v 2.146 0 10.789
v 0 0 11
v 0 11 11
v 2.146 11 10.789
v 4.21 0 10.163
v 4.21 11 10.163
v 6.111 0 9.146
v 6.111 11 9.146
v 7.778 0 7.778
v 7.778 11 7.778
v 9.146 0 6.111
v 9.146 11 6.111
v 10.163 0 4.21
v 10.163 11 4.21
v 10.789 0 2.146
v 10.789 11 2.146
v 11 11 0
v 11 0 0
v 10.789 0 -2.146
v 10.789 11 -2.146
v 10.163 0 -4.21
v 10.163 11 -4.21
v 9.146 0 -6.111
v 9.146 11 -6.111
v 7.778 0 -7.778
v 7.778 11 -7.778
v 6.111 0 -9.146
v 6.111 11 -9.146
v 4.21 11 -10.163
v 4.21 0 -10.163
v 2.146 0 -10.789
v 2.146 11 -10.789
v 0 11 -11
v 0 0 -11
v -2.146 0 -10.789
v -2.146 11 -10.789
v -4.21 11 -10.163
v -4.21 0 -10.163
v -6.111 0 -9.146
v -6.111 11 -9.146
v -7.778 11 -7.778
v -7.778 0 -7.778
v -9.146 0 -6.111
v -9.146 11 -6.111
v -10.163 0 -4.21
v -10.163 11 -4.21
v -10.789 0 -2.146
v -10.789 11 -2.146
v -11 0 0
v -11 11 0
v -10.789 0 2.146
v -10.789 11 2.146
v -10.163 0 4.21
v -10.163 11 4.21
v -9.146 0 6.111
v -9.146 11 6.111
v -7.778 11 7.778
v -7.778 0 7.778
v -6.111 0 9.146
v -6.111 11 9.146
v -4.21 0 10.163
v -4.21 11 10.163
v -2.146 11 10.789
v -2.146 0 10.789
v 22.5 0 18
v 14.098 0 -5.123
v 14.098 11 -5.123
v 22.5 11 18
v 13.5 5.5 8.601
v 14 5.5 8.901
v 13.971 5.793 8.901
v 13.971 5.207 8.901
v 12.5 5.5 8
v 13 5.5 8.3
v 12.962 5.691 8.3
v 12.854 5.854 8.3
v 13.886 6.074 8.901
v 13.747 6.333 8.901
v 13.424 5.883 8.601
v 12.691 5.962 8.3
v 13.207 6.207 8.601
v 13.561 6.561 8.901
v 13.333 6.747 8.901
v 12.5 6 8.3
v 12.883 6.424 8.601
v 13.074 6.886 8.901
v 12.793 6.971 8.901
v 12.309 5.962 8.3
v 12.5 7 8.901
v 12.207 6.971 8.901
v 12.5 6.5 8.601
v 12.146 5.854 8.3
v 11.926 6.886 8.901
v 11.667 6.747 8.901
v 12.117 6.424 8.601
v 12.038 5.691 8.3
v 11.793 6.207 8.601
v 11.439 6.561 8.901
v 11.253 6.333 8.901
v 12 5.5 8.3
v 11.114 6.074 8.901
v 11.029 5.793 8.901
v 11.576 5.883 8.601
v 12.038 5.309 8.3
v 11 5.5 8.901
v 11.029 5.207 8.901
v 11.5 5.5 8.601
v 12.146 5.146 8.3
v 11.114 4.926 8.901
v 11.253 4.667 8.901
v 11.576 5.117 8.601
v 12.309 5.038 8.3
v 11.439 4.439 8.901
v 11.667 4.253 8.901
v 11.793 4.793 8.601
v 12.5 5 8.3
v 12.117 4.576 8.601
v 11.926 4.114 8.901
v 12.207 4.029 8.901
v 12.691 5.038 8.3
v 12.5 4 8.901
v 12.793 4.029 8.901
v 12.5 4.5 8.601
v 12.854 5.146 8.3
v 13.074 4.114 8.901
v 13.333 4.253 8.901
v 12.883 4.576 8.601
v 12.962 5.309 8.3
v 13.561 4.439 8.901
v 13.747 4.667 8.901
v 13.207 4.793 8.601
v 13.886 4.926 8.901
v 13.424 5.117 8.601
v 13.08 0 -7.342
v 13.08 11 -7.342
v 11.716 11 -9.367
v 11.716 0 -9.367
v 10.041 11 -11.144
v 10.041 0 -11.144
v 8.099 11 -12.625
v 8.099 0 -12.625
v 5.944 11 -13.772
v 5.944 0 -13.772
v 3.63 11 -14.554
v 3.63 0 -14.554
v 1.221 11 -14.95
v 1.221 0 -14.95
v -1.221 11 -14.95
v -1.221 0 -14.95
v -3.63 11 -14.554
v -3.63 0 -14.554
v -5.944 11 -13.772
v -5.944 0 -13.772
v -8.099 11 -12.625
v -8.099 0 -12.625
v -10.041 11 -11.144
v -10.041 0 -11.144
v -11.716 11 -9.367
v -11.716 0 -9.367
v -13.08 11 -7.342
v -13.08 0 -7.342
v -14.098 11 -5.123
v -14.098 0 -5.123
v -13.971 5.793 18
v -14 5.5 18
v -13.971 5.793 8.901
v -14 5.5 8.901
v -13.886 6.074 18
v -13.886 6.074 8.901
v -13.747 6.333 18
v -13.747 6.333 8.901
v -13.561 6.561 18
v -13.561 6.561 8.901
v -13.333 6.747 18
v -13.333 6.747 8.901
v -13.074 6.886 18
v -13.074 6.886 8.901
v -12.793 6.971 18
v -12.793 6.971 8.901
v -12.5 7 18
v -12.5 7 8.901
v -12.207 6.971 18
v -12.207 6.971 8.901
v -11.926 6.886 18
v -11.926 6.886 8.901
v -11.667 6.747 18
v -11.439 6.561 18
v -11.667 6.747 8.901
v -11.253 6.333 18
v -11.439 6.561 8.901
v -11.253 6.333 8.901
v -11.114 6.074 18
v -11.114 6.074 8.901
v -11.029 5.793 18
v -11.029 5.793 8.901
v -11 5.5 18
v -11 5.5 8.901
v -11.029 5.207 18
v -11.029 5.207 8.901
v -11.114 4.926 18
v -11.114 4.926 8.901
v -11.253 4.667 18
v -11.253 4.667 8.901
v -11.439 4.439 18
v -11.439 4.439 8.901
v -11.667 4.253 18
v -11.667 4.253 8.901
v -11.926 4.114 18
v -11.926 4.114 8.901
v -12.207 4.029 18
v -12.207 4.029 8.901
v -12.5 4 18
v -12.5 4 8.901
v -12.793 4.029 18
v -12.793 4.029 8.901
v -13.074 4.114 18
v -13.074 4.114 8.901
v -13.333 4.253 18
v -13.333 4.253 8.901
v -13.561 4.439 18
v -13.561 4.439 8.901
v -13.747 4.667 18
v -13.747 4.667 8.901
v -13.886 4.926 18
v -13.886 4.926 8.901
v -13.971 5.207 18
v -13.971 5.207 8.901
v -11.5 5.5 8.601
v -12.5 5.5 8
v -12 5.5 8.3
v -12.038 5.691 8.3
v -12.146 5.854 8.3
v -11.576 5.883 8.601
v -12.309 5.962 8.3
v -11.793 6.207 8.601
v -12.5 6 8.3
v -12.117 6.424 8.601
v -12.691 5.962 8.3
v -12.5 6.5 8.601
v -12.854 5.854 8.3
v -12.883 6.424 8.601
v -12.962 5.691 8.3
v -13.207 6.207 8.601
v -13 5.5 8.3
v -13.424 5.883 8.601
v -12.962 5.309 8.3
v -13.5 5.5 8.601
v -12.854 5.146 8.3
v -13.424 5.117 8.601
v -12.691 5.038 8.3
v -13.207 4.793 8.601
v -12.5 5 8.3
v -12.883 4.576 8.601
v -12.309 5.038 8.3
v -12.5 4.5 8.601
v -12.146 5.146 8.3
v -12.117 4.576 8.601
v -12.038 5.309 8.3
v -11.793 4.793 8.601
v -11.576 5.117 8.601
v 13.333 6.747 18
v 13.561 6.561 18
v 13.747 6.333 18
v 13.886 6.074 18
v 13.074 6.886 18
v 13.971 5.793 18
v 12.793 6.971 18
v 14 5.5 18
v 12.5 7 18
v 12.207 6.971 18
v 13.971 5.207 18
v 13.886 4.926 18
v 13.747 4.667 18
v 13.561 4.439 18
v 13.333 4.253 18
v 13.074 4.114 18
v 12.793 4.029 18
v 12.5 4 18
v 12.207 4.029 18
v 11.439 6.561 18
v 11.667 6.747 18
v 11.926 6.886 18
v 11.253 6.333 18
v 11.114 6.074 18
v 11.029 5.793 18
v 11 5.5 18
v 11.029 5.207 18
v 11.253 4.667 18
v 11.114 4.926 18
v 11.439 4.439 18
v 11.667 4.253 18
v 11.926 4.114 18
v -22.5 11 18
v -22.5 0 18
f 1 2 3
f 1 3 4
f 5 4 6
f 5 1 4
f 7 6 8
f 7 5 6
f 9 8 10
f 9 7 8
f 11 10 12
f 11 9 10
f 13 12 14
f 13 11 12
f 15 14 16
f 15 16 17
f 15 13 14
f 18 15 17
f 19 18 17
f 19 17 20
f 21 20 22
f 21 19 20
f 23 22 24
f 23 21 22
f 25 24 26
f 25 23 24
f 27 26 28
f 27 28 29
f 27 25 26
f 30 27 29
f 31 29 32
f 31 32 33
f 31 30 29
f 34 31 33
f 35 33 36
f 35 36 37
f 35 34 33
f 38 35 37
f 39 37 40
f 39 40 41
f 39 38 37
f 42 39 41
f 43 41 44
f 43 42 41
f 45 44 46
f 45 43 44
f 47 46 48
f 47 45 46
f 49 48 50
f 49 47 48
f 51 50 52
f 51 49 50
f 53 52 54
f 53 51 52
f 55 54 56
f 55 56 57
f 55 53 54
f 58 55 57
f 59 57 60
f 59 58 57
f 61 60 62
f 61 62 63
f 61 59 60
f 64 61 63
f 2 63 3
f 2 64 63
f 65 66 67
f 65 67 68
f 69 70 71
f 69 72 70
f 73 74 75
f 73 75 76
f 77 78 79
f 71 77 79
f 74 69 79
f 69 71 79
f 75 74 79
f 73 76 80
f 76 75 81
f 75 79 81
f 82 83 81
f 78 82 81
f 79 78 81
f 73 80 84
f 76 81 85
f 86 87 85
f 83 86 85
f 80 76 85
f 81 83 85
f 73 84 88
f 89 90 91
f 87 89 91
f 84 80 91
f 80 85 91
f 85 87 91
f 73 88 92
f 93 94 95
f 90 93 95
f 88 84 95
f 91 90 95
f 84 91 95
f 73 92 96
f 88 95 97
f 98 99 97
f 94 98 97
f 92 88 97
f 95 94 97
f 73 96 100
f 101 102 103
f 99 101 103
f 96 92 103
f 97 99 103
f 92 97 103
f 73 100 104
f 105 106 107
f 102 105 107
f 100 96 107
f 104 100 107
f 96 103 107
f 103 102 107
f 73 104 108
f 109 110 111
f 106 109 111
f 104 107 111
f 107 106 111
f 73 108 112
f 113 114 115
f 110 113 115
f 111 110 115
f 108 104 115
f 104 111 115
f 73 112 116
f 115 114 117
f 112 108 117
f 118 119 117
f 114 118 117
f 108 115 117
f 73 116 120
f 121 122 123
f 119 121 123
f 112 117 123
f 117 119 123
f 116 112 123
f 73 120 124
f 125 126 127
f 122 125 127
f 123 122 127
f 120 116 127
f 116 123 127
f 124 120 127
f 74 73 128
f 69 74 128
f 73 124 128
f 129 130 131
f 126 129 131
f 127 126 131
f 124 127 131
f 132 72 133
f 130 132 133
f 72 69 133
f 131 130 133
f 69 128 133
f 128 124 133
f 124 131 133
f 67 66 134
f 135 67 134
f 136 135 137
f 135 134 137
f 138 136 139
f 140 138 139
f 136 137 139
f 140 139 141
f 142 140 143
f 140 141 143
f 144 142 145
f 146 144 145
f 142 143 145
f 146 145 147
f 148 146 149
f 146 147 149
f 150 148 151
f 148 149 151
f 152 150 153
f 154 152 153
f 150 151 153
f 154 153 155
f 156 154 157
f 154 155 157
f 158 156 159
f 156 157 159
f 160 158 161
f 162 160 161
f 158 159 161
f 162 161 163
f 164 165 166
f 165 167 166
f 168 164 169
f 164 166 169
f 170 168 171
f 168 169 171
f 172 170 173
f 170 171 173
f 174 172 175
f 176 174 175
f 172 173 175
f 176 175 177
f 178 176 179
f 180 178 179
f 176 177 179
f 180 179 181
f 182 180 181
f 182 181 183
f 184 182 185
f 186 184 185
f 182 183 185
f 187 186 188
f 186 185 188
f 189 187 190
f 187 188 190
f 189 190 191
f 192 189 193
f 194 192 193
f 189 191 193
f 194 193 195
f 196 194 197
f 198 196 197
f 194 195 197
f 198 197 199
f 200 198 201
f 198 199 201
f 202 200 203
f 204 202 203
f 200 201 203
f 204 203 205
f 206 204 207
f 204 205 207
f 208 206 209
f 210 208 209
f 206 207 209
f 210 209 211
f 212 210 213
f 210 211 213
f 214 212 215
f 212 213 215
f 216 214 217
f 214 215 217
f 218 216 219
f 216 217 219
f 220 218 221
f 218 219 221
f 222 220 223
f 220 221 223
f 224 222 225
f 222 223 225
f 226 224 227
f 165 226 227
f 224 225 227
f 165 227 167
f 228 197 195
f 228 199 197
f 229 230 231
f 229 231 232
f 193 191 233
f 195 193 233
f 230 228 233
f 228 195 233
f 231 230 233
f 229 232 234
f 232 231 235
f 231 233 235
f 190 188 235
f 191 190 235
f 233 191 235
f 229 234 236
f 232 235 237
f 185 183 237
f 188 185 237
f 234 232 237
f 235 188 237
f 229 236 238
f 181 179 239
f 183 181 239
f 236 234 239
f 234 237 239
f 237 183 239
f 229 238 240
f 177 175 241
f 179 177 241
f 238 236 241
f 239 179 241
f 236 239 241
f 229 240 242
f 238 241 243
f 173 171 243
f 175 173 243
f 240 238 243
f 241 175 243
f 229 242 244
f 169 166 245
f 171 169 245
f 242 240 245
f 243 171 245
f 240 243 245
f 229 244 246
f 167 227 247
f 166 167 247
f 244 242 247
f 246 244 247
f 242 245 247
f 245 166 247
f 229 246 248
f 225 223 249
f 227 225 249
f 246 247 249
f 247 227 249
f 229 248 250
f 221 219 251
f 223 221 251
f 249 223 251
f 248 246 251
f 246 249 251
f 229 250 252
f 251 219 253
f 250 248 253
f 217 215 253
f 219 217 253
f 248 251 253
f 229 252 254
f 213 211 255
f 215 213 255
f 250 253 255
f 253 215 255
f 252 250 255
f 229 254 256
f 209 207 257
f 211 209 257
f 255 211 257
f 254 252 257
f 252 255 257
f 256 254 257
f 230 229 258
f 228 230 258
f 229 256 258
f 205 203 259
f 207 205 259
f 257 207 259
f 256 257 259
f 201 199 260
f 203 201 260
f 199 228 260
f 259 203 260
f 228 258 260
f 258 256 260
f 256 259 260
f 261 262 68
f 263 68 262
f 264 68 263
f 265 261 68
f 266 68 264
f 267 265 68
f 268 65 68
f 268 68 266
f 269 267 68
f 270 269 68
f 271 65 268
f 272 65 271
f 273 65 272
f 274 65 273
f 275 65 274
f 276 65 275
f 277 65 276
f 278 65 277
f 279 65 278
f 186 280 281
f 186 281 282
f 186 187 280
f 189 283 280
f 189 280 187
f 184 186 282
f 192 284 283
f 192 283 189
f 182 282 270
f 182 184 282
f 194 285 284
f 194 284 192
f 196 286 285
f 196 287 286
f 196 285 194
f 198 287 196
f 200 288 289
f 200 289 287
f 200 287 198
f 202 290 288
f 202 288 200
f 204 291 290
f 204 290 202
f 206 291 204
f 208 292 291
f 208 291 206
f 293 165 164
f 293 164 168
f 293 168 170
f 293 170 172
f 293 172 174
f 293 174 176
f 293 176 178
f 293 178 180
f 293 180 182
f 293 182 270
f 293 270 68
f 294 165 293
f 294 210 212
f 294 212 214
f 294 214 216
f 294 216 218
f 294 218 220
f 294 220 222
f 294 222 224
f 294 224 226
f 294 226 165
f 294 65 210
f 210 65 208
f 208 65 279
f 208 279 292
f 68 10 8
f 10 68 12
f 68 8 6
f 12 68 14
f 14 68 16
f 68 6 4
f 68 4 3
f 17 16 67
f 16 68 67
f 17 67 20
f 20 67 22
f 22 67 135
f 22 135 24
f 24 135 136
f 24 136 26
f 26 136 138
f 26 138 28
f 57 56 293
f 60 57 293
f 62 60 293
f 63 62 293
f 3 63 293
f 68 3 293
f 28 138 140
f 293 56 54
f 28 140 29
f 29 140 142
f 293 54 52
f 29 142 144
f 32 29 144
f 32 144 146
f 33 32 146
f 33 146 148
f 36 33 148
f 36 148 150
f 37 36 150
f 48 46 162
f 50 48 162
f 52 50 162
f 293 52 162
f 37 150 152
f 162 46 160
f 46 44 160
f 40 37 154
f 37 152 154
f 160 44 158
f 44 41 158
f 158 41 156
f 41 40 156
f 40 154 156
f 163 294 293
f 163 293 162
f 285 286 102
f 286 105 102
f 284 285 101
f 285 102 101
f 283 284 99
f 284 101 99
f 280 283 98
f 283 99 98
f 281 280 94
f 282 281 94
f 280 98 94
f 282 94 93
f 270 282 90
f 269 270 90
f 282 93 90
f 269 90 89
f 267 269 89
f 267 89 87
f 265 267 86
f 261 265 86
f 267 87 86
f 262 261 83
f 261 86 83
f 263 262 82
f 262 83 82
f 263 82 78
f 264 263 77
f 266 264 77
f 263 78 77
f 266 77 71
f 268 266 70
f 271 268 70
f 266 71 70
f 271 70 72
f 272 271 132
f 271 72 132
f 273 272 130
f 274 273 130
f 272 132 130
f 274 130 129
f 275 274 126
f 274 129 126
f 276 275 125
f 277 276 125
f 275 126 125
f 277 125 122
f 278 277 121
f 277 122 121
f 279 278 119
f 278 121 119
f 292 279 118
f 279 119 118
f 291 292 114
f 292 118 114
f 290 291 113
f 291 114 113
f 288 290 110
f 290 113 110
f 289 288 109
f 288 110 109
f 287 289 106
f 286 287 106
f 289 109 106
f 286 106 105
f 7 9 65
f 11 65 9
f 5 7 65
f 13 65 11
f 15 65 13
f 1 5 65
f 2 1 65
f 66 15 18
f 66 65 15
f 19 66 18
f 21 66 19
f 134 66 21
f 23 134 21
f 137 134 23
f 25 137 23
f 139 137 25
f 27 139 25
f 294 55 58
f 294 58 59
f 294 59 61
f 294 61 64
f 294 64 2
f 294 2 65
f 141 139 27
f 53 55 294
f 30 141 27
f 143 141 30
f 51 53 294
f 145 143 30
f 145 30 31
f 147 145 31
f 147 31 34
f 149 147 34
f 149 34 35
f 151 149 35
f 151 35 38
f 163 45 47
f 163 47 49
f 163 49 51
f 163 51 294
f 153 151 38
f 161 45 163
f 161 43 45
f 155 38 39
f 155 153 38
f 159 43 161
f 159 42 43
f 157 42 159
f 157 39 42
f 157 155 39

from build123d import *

# Parameters (mm, degrees)
SKETCH1_R                    = 15
SKETCH1_R_2                  = 11
BOSS_EXTRUDE1_DEPTH          = 11
BOSS_EXTRUDE2_DEPTH          = 11
F_3_0_3_DIAMETER_HOLE1_D     = 3
F_3_0_3_DIAMETER_HOLE1_DEPTH = 9.098709071
F_3_0_3_DIAMETER_HOLE1_TIP   = 0.901290929


with BuildPart() as part:
    # Sketch1 → Boss-Extrude1 (new body)
    with BuildSketch(Plane(origin=(0, 0, 0), x_dir=(1, 0, 0), z_dir=(0, 1, 0))):
        with Locations(Location((0, 0, 0), (0, 0, 270))):
            Circle(SKETCH1_R)
        with Locations(Location((0, 0, 0), (0, 0, 270))):
            Circle(SKETCH1_R_2, mode=Mode.SUBTRACT)
    extrude(amount=BOSS_EXTRUDE1_DEPTH)

    # Sketch2 → Boss-Extrude2 (add)
    with BuildSketch(Plane(origin=(0, 0, 0), x_dir=(1, 0, 0), z_dir=(0, 1, 0))):
        with BuildLine():
            Line((-22.5, -18), (-14.098155837, 5.122694797))
            ThreePointArc((-14.098155837, 5.122694797), (0, -15), (14.098155837, 5.122694797))
            Line((14.098155837, 5.122694797), (22.5, -18))
            Line((22.5, -18), (-22.5, -18))
        make_face()
    extrude(amount=BOSS_EXTRUDE2_DEPTH)

    # Ø3.0 (3) Diameter Hole1
    with Locations(Plane.XY.offset(18)):
        with Locations((-12.5, 5.5), (12.5, 5.5)):
            Hole(F_3_0_3_DIAMETER_HOLE1_D / 2, depth=F_3_0_3_DIAMETER_HOLE1_DEPTH)
            with Locations((0, 0, -(F_3_0_3_DIAMETER_HOLE1_DEPTH + F_3_0_3_DIAMETER_HOLE1_TIP / 2))):  # 118° drill point
                Cone(0, F_3_0_3_DIAMETER_HOLE1_D / 2, F_3_0_3_DIAMETER_HOLE1_TIP, mode=Mode.SUBTRACT)


solid = part.part
